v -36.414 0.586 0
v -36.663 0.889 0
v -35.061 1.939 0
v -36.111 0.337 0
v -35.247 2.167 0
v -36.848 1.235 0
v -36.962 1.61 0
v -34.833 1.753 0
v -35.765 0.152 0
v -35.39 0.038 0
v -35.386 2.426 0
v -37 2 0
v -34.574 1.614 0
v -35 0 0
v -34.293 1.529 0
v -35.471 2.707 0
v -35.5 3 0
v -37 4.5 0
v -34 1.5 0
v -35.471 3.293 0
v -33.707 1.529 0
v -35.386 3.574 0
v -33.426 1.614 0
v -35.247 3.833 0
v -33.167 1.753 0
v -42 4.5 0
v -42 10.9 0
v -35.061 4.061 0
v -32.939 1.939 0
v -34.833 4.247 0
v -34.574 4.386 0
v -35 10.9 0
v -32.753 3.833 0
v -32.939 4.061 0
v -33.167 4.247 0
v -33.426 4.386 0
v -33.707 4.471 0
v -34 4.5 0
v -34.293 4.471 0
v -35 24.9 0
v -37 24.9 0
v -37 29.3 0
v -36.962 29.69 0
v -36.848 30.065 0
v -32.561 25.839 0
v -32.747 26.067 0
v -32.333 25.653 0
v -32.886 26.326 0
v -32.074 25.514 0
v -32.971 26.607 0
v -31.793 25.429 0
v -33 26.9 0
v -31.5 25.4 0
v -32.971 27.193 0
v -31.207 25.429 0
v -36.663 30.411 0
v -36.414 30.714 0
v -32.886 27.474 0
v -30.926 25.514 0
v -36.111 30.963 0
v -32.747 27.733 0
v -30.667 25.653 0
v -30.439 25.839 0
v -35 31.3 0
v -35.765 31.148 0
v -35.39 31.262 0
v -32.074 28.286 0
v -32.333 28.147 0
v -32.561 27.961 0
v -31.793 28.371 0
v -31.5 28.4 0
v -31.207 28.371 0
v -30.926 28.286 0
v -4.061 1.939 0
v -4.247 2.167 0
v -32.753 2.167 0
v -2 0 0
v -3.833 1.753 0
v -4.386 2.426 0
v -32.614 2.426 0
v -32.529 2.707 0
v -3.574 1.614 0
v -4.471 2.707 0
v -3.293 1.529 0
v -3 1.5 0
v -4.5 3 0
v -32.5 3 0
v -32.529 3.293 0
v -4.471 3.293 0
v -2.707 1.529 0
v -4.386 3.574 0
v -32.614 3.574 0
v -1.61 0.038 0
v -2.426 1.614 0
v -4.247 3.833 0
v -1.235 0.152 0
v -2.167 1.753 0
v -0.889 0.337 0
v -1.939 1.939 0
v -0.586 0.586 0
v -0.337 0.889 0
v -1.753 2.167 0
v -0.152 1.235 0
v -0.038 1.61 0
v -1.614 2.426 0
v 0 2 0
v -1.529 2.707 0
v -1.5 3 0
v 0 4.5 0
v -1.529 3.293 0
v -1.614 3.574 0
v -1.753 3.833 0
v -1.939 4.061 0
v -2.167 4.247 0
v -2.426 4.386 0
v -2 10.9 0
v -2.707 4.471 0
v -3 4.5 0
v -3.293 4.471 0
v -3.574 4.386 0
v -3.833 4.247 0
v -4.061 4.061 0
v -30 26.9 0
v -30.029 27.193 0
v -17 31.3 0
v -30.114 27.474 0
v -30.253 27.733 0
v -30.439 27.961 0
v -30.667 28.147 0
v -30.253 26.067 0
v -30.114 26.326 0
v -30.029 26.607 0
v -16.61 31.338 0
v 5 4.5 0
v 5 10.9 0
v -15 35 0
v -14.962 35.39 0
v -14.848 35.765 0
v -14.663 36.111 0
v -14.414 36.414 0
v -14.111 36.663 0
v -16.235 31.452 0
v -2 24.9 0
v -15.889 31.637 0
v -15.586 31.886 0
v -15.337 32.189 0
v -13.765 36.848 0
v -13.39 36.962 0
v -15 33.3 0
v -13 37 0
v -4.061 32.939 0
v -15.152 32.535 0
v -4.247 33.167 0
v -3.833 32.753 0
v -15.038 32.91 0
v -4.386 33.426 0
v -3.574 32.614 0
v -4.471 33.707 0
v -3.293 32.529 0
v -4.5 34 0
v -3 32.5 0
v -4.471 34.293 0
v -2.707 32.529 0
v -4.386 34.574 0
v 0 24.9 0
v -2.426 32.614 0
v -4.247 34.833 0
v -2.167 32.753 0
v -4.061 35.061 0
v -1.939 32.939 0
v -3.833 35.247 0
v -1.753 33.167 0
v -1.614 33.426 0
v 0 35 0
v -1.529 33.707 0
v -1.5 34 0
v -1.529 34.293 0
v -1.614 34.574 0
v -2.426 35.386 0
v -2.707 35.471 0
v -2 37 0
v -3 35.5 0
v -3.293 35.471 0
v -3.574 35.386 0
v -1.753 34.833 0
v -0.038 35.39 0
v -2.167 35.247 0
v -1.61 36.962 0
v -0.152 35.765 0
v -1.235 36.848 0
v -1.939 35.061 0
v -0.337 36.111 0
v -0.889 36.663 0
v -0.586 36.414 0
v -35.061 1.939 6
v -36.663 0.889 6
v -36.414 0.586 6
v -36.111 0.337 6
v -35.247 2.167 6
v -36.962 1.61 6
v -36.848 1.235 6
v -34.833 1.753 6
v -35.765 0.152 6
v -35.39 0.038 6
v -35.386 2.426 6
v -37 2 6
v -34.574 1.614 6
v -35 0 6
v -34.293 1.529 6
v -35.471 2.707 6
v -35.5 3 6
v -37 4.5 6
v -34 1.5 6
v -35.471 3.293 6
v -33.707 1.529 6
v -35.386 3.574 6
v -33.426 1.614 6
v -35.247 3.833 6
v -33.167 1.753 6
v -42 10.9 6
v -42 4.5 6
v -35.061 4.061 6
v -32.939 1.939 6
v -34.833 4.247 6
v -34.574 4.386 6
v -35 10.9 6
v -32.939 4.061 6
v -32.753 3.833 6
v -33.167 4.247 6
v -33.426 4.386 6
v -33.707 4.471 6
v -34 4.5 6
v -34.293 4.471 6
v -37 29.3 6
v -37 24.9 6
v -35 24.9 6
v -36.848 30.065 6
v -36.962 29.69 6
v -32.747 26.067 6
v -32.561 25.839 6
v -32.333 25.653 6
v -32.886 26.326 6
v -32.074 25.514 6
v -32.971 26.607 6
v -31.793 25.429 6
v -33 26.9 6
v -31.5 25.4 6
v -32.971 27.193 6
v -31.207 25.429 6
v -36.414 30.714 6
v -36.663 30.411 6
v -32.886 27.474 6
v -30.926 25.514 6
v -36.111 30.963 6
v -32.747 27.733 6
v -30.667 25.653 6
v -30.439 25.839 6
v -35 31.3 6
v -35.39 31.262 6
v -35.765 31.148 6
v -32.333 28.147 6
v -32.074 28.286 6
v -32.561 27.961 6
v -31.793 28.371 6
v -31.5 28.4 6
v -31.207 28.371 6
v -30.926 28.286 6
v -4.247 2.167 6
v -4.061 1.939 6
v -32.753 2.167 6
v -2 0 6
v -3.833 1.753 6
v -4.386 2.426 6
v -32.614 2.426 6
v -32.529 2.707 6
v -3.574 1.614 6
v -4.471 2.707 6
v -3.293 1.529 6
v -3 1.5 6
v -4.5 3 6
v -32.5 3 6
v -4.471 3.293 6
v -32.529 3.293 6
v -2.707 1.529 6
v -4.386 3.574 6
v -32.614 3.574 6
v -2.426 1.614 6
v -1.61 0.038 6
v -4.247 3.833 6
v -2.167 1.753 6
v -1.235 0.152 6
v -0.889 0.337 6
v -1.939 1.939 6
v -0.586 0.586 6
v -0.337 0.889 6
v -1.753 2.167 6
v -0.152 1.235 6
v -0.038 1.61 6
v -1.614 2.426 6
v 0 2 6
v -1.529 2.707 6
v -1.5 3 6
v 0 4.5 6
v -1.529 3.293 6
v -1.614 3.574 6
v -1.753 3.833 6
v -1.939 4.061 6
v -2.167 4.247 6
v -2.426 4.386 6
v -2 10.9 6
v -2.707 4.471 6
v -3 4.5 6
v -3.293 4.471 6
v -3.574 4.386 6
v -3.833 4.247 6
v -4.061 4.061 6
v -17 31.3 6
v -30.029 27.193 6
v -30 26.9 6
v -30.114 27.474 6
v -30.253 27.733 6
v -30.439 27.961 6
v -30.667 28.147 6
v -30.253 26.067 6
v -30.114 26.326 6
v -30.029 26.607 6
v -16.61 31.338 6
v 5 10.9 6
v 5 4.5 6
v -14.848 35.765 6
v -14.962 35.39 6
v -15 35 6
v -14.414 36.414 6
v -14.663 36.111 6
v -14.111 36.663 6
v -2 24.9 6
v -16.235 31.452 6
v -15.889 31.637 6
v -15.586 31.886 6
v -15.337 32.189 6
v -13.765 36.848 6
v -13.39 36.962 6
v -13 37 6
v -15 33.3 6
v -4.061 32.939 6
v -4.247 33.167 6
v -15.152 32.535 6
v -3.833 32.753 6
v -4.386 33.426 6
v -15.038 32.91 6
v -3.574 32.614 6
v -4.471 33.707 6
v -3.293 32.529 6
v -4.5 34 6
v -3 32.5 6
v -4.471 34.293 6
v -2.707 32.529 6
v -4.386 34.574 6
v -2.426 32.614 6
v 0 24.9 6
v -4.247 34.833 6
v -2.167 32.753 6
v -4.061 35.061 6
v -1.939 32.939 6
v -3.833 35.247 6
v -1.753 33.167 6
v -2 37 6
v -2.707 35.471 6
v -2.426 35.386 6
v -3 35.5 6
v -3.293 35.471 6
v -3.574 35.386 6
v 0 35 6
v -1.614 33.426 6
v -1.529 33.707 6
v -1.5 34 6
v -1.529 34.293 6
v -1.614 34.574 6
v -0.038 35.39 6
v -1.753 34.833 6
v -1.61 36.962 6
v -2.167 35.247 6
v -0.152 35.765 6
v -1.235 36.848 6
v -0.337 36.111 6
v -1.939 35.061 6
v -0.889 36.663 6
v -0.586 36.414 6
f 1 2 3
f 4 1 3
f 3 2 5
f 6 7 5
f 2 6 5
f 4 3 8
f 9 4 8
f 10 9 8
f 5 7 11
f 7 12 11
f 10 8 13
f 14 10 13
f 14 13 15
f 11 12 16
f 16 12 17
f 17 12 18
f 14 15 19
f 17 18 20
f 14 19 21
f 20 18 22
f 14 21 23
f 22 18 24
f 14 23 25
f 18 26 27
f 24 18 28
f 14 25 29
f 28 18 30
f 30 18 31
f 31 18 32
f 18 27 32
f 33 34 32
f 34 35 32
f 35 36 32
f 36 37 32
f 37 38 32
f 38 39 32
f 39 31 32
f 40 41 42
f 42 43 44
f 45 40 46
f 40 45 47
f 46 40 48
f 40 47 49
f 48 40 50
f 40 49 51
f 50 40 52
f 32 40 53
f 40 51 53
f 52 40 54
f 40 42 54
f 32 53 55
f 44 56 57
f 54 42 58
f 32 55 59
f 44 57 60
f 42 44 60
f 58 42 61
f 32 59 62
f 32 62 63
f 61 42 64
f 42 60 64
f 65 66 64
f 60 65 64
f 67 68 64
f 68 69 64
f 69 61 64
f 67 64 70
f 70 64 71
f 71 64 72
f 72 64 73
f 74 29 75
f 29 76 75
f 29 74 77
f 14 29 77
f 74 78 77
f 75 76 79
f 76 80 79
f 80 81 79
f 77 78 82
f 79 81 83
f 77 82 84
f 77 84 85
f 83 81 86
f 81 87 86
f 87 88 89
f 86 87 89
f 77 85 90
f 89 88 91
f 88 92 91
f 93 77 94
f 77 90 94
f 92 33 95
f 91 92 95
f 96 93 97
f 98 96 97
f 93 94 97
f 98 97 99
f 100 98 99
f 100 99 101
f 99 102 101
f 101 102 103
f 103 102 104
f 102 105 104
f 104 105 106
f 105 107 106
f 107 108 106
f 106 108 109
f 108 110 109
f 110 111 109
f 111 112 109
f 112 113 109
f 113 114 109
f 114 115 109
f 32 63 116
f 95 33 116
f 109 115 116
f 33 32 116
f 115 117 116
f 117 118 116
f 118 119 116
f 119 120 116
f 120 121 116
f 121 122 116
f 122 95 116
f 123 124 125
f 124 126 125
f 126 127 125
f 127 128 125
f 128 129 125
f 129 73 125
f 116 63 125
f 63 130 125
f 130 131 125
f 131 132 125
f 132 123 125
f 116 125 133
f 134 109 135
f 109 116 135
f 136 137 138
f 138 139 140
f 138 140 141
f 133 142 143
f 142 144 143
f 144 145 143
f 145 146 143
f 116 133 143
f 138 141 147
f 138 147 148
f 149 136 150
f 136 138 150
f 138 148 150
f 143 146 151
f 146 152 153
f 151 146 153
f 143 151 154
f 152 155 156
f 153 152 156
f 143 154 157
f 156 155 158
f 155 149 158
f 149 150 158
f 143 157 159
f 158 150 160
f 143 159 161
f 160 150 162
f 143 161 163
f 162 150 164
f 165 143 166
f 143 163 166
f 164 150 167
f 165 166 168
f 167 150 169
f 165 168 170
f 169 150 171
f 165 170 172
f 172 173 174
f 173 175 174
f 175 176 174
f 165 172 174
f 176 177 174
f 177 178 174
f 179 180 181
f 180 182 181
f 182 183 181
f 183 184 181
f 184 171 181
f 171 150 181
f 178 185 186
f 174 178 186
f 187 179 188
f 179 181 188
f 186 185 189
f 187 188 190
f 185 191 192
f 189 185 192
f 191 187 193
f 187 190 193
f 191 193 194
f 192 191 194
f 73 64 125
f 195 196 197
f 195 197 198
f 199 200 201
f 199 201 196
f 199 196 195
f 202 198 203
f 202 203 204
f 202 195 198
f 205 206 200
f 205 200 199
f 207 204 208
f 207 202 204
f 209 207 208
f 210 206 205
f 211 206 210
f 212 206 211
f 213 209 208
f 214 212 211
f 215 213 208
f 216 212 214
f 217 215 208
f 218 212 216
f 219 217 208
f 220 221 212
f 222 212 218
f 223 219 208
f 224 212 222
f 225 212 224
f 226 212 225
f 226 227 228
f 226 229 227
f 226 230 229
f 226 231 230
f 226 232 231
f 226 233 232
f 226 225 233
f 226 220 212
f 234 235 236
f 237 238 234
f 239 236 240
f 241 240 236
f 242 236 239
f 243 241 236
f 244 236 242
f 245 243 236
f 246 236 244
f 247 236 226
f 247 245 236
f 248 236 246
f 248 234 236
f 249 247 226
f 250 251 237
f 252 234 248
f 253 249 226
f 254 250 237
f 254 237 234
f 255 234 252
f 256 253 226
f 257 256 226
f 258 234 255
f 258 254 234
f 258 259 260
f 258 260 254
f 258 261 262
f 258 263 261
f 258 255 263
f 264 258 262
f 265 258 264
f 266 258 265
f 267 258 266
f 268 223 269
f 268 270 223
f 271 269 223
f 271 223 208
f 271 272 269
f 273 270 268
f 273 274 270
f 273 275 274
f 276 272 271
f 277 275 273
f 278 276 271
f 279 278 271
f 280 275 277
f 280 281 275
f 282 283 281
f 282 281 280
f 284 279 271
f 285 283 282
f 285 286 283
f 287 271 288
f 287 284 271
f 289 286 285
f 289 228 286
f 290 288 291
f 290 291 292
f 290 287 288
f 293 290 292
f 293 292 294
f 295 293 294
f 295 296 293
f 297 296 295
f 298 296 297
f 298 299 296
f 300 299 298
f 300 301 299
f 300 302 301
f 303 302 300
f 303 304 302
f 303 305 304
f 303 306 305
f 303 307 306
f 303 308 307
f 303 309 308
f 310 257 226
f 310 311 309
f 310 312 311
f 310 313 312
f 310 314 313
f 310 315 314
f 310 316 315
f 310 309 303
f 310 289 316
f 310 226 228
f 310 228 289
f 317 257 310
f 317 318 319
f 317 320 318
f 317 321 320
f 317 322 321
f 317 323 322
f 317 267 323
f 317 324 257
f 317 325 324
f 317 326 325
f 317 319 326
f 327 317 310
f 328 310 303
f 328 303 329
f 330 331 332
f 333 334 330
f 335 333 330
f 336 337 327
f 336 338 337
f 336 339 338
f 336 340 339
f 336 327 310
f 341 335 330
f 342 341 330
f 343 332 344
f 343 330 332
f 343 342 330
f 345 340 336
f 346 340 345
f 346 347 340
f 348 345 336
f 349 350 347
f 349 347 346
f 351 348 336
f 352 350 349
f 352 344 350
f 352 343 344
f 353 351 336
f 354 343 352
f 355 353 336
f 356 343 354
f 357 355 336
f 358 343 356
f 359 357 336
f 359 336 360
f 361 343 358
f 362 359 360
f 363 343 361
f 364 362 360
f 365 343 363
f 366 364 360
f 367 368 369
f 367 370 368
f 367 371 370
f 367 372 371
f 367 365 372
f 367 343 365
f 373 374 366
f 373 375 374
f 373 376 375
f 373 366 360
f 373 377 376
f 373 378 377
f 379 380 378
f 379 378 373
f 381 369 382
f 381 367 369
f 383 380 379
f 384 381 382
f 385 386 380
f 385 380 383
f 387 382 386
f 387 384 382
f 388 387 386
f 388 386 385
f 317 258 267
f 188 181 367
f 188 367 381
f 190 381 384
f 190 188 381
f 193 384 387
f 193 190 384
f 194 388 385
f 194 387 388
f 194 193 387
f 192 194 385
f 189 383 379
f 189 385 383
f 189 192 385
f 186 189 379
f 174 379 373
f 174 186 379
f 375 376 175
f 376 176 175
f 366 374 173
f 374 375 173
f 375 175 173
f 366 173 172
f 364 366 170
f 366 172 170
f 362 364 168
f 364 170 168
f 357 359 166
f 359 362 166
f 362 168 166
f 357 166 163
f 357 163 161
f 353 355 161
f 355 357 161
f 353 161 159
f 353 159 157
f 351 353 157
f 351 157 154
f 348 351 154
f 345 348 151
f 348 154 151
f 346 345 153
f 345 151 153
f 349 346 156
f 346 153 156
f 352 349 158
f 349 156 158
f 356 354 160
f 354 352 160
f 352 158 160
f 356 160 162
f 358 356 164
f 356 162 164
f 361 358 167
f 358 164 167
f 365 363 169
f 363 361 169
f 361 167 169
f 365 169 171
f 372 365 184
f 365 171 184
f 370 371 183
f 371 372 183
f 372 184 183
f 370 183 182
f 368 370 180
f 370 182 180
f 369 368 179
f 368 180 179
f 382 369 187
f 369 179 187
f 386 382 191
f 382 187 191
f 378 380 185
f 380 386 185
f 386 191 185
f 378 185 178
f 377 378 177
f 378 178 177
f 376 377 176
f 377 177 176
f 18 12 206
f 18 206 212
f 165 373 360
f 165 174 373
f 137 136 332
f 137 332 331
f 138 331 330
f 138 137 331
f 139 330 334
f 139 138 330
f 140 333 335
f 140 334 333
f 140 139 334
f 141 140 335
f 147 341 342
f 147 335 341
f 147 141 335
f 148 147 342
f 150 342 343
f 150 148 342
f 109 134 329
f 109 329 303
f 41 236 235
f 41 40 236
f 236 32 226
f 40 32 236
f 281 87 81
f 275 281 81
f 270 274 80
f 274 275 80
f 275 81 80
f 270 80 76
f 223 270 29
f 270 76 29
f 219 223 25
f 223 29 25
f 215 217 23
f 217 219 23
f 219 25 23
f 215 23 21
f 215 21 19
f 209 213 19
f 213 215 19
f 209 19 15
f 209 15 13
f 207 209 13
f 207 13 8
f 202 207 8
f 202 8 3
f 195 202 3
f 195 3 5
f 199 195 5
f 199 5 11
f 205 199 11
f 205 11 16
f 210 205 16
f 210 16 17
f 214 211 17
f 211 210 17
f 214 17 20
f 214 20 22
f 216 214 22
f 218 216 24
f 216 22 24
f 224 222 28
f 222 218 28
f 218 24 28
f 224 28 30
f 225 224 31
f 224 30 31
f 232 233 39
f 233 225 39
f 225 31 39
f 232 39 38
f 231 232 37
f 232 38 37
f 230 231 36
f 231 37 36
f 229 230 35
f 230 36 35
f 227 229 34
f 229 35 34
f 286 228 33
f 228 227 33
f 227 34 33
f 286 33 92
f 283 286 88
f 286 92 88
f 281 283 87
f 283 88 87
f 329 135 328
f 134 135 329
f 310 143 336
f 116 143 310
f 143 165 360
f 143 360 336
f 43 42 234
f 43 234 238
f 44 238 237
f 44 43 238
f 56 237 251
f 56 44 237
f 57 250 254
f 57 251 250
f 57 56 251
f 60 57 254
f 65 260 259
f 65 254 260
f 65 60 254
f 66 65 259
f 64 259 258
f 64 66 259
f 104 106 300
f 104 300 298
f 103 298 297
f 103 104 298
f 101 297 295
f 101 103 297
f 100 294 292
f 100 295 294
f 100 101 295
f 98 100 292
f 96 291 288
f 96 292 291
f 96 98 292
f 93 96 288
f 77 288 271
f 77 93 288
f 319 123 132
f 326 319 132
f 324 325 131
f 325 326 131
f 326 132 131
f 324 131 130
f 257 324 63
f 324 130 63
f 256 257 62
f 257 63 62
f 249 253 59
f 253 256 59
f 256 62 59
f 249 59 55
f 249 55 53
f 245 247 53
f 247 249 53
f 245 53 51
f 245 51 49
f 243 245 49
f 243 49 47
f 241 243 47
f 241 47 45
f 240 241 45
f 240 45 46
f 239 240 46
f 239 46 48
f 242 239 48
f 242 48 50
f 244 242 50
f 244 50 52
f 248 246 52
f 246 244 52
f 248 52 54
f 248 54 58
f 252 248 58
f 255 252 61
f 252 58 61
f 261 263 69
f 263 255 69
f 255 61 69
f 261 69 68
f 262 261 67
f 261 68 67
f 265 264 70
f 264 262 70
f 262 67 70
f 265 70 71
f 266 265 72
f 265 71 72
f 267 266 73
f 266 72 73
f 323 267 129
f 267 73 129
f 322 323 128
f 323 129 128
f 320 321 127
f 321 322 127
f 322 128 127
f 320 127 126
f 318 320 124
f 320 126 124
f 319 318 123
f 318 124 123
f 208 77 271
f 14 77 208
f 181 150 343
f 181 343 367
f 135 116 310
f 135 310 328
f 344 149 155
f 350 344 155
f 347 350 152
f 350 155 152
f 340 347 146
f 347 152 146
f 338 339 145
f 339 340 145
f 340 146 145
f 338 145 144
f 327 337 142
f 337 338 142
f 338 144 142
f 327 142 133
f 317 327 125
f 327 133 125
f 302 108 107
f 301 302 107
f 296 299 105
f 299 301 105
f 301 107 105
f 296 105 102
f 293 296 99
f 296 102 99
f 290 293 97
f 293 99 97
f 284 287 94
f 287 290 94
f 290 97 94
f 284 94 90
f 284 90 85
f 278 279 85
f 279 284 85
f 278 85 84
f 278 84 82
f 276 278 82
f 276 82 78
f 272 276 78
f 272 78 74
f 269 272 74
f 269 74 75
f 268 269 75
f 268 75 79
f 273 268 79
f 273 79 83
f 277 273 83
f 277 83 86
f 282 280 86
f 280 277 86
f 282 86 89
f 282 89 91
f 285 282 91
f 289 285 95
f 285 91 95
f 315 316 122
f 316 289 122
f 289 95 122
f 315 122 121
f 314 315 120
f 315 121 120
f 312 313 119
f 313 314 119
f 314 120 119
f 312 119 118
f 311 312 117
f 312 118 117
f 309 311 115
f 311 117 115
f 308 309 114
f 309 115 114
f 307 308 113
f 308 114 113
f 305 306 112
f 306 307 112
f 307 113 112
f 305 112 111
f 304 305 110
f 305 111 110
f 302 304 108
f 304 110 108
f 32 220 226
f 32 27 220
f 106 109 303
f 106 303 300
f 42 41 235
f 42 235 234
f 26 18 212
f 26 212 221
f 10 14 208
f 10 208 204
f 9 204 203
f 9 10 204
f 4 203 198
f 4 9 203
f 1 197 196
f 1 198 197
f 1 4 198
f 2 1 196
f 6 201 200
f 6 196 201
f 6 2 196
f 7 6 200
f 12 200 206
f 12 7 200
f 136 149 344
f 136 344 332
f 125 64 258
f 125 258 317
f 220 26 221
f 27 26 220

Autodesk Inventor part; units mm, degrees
ref_plane "YZ Plane" through (0, 0, 0) normal (1, 0, 0) x (0, 1, 0)
ref_plane "XZ Plane" through (0, 0, 0) normal (0, 1, 0) x (-1, 0, 0)
ref_plane "XY Plane" through (0, 0, 0) normal (0, 0, 1) x (1, 0, 0)
sketch "Sketch1" plane through (0, 0, 0) normal (0, 0, 1) x (1, 0, 0)
  arc A0 (-2, 0) -> (0, 2) centre (-2, 2) ccw
  line L0 (0, 4.5) -> (0, 2)
  line L1 (5, 4.5) -> (0, 4.5)
  line L2 (5, 10.9) -> (5, 4.5)
  line L3 (-2, 10.9) -> (5, 10.9)
  line L4 (-2, 24.9) -> (-2, 10.9)
  line L5 (0, 24.9) -> (-2, 24.9)
  line L6 (0, 35) -> (0, 24.9)
  arc A1 (0, 35) -> (-2, 37) centre (-2, 35) ccw
  line L7 (-13, 37) -> (-2, 37)
  arc A2 (-13, 37) -> (-15, 35) centre (-13, 35) ccw
  line L8 (-15, 33.3) -> (-15, 35)
  arc A3 (-17, 31.3) -> (-15, 33.3) centre (-17, 33.3) ccw
  line L9 (-35, 31.3) -> (-17, 31.3)
  arc A4 (-35, 31.3) -> (-37, 29.3) centre (-35, 29.3) ccw
  line L10 (-37, 24.9) -> (-37, 29.3)
  line L11 (-35, 24.9) -> (-37, 24.9)
  line L12 (-35, 10.9) -> (-35, 24.9)
  line L13 (-42, 10.9) -> (-35, 10.9)
  line L14 (-42, 4.5) -> (-42, 10.9)
  line L15 (-37, 4.5) -> (-42, 4.5)
  line L16 (-37, 2) -> (-37, 4.5)
  arc A5 (-37, 2) -> (-35, 0) centre (-35, 2) ccw
  line L17 (-2, 0) -> (-35, 0)
  circle A6 centre (-3, 34) radius 1.5
  circle A7 centre (-34, 3) radius 1.5
  circle A8 centre (-3, 3) radius 1.5
  circle A9 centre (-31.5, 26.9) radius 1.5
  point P0 (0, 0)
  point P1 (0, 0)
extrude "Extrusion1" add sketch "Sketch1" along normal blind 6
properties part number "XcrRightTop"
